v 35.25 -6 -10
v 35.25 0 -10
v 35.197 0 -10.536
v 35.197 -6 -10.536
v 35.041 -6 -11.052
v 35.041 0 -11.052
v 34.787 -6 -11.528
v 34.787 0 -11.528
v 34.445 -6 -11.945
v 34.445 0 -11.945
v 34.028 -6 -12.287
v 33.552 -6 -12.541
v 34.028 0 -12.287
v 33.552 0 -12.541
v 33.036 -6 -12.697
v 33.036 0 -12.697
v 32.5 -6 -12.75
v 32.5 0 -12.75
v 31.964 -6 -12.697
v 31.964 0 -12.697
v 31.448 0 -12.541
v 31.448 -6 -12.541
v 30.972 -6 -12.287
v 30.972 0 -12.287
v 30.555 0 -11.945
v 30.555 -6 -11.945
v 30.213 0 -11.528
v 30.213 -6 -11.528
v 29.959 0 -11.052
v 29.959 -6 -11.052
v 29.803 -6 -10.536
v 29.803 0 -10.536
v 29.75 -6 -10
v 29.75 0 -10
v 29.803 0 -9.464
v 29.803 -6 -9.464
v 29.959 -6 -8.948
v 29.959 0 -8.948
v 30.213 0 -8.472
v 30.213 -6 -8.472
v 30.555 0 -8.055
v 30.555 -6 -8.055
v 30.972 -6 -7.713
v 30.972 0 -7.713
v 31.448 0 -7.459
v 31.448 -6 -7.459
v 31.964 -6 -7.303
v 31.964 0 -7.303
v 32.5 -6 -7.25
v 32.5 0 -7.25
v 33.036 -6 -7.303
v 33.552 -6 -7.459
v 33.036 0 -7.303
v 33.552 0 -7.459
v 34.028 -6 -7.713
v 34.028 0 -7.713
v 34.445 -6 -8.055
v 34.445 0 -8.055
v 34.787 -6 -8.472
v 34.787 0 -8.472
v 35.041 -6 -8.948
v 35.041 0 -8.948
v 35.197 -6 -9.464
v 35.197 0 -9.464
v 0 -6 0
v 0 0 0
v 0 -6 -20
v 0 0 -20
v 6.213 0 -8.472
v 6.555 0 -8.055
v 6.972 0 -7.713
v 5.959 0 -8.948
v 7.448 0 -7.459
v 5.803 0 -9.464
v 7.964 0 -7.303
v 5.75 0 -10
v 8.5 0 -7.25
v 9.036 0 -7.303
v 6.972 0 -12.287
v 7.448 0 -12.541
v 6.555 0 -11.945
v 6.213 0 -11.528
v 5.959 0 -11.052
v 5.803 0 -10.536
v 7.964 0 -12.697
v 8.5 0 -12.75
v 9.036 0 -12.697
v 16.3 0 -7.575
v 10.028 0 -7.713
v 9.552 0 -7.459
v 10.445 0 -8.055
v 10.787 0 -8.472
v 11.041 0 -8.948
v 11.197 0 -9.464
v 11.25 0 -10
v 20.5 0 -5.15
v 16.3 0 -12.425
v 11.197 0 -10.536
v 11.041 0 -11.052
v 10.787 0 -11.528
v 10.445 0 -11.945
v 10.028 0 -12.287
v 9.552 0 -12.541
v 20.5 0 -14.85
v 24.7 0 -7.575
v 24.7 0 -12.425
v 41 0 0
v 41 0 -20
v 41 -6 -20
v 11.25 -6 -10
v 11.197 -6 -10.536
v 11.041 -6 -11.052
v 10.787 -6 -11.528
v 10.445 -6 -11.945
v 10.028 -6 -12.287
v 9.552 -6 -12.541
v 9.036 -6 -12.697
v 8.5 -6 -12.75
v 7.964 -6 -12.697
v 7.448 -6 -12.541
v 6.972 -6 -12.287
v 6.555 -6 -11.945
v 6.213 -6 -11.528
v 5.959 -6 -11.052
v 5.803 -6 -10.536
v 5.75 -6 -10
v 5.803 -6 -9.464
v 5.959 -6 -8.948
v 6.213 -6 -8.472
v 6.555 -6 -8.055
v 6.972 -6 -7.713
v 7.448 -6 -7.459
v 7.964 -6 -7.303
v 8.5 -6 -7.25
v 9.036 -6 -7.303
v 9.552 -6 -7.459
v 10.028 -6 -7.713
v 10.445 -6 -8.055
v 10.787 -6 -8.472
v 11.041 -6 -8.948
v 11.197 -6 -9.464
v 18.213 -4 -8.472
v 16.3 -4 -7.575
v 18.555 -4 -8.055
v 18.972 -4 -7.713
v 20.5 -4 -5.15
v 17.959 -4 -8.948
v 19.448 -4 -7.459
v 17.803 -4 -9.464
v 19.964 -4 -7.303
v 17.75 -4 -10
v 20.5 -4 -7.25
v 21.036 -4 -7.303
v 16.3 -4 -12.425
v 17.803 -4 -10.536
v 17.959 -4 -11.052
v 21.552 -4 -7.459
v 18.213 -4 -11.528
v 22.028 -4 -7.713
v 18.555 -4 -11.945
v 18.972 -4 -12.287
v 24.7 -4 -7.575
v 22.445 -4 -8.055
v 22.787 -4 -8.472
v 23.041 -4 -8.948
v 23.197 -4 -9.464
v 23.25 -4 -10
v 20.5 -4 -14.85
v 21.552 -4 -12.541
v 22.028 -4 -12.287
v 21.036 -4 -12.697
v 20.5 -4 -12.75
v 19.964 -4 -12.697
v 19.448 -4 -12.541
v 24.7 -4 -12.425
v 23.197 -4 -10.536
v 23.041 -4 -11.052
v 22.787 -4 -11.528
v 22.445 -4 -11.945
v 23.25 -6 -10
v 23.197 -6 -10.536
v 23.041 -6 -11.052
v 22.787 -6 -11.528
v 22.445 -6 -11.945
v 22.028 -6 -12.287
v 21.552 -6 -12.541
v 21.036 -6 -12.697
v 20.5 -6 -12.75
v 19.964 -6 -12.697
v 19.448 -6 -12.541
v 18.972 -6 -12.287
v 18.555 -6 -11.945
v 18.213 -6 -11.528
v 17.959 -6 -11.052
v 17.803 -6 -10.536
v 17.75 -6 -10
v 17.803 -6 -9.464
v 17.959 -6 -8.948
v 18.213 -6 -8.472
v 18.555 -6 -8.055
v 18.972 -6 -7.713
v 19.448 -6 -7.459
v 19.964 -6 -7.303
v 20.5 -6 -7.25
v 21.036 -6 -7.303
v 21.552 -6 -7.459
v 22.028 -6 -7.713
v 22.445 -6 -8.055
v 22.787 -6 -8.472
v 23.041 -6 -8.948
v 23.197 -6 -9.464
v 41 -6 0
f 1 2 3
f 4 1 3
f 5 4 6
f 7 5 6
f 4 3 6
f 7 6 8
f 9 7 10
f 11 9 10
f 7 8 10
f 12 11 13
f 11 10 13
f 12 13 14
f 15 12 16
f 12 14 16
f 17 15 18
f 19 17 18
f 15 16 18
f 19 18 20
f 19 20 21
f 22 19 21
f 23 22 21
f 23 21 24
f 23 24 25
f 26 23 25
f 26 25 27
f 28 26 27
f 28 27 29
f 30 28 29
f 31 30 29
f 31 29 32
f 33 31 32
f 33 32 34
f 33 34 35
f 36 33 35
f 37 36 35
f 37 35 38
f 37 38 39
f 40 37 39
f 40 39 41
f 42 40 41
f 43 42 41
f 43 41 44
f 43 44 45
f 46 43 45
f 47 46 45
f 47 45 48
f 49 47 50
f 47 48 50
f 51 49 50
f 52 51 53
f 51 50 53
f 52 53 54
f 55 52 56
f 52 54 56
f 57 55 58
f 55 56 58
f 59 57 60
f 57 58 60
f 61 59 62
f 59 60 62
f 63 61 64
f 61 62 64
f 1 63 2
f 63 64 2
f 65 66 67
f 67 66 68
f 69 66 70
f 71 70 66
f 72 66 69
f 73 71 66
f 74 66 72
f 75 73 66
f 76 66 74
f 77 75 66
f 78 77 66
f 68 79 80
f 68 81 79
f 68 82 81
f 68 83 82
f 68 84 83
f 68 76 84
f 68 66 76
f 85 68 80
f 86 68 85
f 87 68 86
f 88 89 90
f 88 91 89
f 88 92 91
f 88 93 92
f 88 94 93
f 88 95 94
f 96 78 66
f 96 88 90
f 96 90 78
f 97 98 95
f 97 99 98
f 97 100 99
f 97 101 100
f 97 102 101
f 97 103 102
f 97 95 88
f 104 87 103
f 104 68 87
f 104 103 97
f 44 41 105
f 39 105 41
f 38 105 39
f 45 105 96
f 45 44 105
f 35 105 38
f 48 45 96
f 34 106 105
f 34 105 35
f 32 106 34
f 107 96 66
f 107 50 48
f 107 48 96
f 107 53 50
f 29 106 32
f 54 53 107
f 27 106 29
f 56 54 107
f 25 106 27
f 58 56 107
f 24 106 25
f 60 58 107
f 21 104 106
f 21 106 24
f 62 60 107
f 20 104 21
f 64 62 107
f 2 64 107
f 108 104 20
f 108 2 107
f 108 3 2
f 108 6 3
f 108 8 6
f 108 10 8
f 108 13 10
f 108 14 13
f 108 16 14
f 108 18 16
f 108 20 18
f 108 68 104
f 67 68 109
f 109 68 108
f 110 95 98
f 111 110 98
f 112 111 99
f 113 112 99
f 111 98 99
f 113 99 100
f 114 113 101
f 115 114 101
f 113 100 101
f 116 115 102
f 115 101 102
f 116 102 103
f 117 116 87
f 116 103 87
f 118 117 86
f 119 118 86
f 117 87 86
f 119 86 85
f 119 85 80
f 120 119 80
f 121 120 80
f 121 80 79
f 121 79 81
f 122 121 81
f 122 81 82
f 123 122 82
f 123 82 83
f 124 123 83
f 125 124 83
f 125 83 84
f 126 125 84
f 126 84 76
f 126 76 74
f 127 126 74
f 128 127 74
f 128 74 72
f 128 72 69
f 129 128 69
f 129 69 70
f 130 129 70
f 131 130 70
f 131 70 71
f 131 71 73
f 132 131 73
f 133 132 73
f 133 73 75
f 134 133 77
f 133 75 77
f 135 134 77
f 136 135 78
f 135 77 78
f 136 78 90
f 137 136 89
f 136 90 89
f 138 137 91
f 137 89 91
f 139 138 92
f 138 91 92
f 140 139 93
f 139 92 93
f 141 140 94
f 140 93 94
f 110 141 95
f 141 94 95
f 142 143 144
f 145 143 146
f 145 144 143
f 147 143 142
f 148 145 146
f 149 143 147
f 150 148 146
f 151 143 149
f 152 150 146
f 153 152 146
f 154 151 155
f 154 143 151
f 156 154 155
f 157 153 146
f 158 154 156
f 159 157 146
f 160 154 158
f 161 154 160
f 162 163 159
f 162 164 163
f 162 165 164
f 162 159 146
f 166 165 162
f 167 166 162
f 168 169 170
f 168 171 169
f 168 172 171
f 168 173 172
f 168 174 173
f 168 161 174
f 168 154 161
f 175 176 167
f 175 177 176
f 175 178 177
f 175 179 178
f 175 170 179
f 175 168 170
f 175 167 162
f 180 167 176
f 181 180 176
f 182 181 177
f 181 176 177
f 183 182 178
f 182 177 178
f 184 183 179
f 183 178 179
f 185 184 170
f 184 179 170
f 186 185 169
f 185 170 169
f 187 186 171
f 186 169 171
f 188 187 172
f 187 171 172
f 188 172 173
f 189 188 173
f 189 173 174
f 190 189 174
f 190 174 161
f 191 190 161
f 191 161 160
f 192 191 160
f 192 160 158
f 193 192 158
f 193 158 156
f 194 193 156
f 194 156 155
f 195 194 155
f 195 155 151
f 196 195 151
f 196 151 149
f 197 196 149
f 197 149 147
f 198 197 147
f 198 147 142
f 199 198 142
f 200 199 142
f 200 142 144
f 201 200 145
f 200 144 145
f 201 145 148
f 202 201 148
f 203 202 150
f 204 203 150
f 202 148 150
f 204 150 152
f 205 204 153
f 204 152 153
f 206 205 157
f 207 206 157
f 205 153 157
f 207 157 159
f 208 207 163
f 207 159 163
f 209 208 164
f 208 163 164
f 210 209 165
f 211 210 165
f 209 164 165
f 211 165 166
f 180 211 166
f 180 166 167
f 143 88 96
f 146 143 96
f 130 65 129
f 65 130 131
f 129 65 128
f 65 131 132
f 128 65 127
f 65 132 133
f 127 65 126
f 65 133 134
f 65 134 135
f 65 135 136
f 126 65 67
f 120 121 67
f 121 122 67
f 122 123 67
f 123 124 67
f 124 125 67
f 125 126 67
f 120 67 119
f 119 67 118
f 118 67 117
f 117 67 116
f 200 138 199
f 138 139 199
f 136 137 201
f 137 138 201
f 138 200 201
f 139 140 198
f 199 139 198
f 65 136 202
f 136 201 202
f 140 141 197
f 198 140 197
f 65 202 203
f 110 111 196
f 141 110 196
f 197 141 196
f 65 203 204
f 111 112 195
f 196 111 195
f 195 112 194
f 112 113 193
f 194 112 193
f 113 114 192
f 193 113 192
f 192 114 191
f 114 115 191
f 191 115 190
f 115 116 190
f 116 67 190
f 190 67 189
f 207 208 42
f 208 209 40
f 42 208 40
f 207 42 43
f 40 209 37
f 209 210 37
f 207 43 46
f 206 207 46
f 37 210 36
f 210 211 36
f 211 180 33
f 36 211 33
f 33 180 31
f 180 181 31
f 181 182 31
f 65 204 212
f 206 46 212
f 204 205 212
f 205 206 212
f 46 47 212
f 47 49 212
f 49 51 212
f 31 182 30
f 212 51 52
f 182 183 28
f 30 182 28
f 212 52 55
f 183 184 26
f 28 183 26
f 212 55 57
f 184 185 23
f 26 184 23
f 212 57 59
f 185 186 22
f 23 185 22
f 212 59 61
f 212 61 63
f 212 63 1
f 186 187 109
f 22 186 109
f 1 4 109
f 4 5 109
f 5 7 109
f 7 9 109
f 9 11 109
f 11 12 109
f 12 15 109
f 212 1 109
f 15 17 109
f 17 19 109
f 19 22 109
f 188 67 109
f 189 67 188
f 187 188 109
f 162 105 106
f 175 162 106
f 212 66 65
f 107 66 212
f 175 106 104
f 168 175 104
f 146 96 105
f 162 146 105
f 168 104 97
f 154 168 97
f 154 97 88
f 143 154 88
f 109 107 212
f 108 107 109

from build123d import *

# Parameters (mm, degrees)
SKETCH1_W           = 41
SKETCH1_H           = 20
BOSS_EXTRUDE1_DEPTH = 6
NUT_DEPTH           = 4
SKETCH7_R           = 2.75
HOLES_DEPTH         = 7


with BuildPart() as part:
    # Sketch1 → Boss-Extrude1 (new body)
    with BuildSketch(Plane(origin=(0, 0, 0), x_dir=(1, 0, 0), z_dir=(0, 1, 0))):
        with Locations((20.5, 10)):
            Rectangle(SKETCH1_W, SKETCH1_H)
    extrude(amount=-BOSS_EXTRUDE1_DEPTH)

    # Sketch2 → nut (cut)
    with BuildSketch(Plane(origin=(0, 0, 0), x_dir=(1, 0, 0), z_dir=(0, 1, 0))):
        Polygon((20.5, 5.150257739), (24.7, 7.575128869), (24.7, 12.424871131), (20.5, 14.849742261), (16.3, 12.424871131), (16.3, 7.575128869), align=None)
    extrude(amount=-NUT_DEPTH, mode=Mode.SUBTRACT)

    # Sketch7 → holes (cut, through all)
    with BuildSketch(Plane(origin=(0, 0, 0), x_dir=(1, 0, 0), z_dir=(0, 1, 0))):
        with Locations((8.5, 10)):
            Circle(SKETCH7_R)
        with Locations((32.5, 10)):
            Circle(SKETCH7_R)
        with Locations((20.5, 10)):
            Circle(SKETCH7_R)
    extrude(amount=-HOLES_DEPTH, mode=Mode.SUBTRACT)


solid = part.part
